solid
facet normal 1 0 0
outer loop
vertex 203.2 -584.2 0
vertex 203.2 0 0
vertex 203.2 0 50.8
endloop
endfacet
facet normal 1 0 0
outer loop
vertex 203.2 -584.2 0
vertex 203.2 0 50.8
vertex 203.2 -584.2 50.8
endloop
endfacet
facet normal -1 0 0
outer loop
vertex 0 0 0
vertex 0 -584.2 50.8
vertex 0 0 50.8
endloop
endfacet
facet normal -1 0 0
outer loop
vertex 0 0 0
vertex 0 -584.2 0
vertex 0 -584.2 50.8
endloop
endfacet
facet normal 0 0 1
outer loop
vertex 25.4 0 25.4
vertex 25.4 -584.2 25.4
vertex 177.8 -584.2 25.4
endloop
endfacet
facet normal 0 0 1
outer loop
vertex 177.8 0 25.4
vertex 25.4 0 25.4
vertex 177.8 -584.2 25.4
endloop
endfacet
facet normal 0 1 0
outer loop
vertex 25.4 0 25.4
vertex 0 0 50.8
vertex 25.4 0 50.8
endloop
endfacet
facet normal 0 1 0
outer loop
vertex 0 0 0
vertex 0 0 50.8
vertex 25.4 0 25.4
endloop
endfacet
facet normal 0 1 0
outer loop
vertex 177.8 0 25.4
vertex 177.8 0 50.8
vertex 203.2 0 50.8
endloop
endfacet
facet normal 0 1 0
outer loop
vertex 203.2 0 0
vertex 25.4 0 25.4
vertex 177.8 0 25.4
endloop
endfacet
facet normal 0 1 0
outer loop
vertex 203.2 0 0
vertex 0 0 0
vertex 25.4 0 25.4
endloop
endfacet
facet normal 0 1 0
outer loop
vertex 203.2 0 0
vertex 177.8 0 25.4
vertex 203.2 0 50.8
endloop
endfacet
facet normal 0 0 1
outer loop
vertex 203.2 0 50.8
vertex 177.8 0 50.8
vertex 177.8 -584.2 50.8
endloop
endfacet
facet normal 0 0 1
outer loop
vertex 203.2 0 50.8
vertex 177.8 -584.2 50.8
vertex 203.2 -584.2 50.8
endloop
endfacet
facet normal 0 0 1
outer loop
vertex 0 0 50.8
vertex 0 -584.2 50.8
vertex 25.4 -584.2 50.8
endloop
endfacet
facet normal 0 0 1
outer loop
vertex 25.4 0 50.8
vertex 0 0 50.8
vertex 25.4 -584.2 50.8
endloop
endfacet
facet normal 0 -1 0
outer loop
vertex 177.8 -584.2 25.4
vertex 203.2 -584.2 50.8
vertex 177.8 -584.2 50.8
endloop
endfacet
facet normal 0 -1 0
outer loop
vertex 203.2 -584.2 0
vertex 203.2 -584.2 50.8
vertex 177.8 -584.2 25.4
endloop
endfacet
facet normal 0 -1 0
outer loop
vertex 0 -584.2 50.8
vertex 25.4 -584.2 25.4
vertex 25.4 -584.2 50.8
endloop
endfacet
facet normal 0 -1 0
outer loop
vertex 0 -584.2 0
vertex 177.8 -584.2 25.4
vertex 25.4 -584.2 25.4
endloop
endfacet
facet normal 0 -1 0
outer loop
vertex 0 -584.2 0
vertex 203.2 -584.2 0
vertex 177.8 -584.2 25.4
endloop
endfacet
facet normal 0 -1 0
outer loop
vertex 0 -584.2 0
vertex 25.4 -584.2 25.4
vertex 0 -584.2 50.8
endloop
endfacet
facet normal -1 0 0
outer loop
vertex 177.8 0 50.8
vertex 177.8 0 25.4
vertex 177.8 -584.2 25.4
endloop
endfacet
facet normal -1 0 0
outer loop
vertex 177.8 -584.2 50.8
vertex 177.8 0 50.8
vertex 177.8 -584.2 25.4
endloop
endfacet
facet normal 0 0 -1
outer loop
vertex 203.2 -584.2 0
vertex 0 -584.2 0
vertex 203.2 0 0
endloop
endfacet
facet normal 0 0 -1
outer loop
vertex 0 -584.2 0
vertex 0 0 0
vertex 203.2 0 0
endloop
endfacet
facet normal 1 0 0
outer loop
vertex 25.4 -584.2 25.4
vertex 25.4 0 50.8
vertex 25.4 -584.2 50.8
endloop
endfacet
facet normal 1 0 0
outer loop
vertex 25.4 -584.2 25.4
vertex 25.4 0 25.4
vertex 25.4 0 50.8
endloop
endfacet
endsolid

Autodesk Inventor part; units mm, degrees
ref_plane "YZ Plane" through (0, 0, 0) normal (1, 0, 0) x (0, 1, 0)
ref_plane "XZ Plane" through (0, 0, 0) normal (0, 1, 0) x (-1, 0, 0)
ref_plane "XY Plane" through (0, 0, 0) normal (0, 0, 1) x (1, 0, 0)
sketch "Sketch1" plane through (0, 0, 0) normal (0, 0, 1) x (1, 0, 0)
  line L0 (0, 0) -> (203.2, 0)
  line L1 (203.2, 0) -> (203.2, -584.2)
  line L2 (203.2, -584.2) -> (0, -584.2)
  line L3 (0, -584.2) -> (0, 0)
  dimension "d0" = 203.2
  dimension "d1" = 584.2
extrude "Extrusion1" add sketch "Sketch1" along normal blind 25.4
sketch "Sketch2" plane through (0, 0, 25.4) normal (0, 0, 1) x (1, 0, 0)
  line L0 (0, -584.2) -> (203.2, -584.2) projected
  line L1 (0, 0) -> (25.4, 0)
  line L2 (25.4, 0) -> (25.4, -584.2)
  line L3 (25.4, -584.2) -> (0, -584.2)
  line L4 (0, -584.2) -> (0, 0)
  line L5 (203.2, 0) -> (0, 0) projected
  line L6 (203.2, 0) -> (177.8, 0)
  line L7 (177.8, 0) -> (177.8, -584.2)
  line L8 (177.8, -584.2) -> (203.2, -584.2)
  line L9 (203.2, -584.2) -> (203.2, 0)
  dimension "d4" = 25.4
  dimension "d5" = 25.4
  dimension "d6" = 584.2
extrude "Extrusion2" add sketch "Sketch2" along normal blind 25.4 contours L4 L1 L2 L0 | L7 L5 L9 L0
properties part number "rev1 tube"
